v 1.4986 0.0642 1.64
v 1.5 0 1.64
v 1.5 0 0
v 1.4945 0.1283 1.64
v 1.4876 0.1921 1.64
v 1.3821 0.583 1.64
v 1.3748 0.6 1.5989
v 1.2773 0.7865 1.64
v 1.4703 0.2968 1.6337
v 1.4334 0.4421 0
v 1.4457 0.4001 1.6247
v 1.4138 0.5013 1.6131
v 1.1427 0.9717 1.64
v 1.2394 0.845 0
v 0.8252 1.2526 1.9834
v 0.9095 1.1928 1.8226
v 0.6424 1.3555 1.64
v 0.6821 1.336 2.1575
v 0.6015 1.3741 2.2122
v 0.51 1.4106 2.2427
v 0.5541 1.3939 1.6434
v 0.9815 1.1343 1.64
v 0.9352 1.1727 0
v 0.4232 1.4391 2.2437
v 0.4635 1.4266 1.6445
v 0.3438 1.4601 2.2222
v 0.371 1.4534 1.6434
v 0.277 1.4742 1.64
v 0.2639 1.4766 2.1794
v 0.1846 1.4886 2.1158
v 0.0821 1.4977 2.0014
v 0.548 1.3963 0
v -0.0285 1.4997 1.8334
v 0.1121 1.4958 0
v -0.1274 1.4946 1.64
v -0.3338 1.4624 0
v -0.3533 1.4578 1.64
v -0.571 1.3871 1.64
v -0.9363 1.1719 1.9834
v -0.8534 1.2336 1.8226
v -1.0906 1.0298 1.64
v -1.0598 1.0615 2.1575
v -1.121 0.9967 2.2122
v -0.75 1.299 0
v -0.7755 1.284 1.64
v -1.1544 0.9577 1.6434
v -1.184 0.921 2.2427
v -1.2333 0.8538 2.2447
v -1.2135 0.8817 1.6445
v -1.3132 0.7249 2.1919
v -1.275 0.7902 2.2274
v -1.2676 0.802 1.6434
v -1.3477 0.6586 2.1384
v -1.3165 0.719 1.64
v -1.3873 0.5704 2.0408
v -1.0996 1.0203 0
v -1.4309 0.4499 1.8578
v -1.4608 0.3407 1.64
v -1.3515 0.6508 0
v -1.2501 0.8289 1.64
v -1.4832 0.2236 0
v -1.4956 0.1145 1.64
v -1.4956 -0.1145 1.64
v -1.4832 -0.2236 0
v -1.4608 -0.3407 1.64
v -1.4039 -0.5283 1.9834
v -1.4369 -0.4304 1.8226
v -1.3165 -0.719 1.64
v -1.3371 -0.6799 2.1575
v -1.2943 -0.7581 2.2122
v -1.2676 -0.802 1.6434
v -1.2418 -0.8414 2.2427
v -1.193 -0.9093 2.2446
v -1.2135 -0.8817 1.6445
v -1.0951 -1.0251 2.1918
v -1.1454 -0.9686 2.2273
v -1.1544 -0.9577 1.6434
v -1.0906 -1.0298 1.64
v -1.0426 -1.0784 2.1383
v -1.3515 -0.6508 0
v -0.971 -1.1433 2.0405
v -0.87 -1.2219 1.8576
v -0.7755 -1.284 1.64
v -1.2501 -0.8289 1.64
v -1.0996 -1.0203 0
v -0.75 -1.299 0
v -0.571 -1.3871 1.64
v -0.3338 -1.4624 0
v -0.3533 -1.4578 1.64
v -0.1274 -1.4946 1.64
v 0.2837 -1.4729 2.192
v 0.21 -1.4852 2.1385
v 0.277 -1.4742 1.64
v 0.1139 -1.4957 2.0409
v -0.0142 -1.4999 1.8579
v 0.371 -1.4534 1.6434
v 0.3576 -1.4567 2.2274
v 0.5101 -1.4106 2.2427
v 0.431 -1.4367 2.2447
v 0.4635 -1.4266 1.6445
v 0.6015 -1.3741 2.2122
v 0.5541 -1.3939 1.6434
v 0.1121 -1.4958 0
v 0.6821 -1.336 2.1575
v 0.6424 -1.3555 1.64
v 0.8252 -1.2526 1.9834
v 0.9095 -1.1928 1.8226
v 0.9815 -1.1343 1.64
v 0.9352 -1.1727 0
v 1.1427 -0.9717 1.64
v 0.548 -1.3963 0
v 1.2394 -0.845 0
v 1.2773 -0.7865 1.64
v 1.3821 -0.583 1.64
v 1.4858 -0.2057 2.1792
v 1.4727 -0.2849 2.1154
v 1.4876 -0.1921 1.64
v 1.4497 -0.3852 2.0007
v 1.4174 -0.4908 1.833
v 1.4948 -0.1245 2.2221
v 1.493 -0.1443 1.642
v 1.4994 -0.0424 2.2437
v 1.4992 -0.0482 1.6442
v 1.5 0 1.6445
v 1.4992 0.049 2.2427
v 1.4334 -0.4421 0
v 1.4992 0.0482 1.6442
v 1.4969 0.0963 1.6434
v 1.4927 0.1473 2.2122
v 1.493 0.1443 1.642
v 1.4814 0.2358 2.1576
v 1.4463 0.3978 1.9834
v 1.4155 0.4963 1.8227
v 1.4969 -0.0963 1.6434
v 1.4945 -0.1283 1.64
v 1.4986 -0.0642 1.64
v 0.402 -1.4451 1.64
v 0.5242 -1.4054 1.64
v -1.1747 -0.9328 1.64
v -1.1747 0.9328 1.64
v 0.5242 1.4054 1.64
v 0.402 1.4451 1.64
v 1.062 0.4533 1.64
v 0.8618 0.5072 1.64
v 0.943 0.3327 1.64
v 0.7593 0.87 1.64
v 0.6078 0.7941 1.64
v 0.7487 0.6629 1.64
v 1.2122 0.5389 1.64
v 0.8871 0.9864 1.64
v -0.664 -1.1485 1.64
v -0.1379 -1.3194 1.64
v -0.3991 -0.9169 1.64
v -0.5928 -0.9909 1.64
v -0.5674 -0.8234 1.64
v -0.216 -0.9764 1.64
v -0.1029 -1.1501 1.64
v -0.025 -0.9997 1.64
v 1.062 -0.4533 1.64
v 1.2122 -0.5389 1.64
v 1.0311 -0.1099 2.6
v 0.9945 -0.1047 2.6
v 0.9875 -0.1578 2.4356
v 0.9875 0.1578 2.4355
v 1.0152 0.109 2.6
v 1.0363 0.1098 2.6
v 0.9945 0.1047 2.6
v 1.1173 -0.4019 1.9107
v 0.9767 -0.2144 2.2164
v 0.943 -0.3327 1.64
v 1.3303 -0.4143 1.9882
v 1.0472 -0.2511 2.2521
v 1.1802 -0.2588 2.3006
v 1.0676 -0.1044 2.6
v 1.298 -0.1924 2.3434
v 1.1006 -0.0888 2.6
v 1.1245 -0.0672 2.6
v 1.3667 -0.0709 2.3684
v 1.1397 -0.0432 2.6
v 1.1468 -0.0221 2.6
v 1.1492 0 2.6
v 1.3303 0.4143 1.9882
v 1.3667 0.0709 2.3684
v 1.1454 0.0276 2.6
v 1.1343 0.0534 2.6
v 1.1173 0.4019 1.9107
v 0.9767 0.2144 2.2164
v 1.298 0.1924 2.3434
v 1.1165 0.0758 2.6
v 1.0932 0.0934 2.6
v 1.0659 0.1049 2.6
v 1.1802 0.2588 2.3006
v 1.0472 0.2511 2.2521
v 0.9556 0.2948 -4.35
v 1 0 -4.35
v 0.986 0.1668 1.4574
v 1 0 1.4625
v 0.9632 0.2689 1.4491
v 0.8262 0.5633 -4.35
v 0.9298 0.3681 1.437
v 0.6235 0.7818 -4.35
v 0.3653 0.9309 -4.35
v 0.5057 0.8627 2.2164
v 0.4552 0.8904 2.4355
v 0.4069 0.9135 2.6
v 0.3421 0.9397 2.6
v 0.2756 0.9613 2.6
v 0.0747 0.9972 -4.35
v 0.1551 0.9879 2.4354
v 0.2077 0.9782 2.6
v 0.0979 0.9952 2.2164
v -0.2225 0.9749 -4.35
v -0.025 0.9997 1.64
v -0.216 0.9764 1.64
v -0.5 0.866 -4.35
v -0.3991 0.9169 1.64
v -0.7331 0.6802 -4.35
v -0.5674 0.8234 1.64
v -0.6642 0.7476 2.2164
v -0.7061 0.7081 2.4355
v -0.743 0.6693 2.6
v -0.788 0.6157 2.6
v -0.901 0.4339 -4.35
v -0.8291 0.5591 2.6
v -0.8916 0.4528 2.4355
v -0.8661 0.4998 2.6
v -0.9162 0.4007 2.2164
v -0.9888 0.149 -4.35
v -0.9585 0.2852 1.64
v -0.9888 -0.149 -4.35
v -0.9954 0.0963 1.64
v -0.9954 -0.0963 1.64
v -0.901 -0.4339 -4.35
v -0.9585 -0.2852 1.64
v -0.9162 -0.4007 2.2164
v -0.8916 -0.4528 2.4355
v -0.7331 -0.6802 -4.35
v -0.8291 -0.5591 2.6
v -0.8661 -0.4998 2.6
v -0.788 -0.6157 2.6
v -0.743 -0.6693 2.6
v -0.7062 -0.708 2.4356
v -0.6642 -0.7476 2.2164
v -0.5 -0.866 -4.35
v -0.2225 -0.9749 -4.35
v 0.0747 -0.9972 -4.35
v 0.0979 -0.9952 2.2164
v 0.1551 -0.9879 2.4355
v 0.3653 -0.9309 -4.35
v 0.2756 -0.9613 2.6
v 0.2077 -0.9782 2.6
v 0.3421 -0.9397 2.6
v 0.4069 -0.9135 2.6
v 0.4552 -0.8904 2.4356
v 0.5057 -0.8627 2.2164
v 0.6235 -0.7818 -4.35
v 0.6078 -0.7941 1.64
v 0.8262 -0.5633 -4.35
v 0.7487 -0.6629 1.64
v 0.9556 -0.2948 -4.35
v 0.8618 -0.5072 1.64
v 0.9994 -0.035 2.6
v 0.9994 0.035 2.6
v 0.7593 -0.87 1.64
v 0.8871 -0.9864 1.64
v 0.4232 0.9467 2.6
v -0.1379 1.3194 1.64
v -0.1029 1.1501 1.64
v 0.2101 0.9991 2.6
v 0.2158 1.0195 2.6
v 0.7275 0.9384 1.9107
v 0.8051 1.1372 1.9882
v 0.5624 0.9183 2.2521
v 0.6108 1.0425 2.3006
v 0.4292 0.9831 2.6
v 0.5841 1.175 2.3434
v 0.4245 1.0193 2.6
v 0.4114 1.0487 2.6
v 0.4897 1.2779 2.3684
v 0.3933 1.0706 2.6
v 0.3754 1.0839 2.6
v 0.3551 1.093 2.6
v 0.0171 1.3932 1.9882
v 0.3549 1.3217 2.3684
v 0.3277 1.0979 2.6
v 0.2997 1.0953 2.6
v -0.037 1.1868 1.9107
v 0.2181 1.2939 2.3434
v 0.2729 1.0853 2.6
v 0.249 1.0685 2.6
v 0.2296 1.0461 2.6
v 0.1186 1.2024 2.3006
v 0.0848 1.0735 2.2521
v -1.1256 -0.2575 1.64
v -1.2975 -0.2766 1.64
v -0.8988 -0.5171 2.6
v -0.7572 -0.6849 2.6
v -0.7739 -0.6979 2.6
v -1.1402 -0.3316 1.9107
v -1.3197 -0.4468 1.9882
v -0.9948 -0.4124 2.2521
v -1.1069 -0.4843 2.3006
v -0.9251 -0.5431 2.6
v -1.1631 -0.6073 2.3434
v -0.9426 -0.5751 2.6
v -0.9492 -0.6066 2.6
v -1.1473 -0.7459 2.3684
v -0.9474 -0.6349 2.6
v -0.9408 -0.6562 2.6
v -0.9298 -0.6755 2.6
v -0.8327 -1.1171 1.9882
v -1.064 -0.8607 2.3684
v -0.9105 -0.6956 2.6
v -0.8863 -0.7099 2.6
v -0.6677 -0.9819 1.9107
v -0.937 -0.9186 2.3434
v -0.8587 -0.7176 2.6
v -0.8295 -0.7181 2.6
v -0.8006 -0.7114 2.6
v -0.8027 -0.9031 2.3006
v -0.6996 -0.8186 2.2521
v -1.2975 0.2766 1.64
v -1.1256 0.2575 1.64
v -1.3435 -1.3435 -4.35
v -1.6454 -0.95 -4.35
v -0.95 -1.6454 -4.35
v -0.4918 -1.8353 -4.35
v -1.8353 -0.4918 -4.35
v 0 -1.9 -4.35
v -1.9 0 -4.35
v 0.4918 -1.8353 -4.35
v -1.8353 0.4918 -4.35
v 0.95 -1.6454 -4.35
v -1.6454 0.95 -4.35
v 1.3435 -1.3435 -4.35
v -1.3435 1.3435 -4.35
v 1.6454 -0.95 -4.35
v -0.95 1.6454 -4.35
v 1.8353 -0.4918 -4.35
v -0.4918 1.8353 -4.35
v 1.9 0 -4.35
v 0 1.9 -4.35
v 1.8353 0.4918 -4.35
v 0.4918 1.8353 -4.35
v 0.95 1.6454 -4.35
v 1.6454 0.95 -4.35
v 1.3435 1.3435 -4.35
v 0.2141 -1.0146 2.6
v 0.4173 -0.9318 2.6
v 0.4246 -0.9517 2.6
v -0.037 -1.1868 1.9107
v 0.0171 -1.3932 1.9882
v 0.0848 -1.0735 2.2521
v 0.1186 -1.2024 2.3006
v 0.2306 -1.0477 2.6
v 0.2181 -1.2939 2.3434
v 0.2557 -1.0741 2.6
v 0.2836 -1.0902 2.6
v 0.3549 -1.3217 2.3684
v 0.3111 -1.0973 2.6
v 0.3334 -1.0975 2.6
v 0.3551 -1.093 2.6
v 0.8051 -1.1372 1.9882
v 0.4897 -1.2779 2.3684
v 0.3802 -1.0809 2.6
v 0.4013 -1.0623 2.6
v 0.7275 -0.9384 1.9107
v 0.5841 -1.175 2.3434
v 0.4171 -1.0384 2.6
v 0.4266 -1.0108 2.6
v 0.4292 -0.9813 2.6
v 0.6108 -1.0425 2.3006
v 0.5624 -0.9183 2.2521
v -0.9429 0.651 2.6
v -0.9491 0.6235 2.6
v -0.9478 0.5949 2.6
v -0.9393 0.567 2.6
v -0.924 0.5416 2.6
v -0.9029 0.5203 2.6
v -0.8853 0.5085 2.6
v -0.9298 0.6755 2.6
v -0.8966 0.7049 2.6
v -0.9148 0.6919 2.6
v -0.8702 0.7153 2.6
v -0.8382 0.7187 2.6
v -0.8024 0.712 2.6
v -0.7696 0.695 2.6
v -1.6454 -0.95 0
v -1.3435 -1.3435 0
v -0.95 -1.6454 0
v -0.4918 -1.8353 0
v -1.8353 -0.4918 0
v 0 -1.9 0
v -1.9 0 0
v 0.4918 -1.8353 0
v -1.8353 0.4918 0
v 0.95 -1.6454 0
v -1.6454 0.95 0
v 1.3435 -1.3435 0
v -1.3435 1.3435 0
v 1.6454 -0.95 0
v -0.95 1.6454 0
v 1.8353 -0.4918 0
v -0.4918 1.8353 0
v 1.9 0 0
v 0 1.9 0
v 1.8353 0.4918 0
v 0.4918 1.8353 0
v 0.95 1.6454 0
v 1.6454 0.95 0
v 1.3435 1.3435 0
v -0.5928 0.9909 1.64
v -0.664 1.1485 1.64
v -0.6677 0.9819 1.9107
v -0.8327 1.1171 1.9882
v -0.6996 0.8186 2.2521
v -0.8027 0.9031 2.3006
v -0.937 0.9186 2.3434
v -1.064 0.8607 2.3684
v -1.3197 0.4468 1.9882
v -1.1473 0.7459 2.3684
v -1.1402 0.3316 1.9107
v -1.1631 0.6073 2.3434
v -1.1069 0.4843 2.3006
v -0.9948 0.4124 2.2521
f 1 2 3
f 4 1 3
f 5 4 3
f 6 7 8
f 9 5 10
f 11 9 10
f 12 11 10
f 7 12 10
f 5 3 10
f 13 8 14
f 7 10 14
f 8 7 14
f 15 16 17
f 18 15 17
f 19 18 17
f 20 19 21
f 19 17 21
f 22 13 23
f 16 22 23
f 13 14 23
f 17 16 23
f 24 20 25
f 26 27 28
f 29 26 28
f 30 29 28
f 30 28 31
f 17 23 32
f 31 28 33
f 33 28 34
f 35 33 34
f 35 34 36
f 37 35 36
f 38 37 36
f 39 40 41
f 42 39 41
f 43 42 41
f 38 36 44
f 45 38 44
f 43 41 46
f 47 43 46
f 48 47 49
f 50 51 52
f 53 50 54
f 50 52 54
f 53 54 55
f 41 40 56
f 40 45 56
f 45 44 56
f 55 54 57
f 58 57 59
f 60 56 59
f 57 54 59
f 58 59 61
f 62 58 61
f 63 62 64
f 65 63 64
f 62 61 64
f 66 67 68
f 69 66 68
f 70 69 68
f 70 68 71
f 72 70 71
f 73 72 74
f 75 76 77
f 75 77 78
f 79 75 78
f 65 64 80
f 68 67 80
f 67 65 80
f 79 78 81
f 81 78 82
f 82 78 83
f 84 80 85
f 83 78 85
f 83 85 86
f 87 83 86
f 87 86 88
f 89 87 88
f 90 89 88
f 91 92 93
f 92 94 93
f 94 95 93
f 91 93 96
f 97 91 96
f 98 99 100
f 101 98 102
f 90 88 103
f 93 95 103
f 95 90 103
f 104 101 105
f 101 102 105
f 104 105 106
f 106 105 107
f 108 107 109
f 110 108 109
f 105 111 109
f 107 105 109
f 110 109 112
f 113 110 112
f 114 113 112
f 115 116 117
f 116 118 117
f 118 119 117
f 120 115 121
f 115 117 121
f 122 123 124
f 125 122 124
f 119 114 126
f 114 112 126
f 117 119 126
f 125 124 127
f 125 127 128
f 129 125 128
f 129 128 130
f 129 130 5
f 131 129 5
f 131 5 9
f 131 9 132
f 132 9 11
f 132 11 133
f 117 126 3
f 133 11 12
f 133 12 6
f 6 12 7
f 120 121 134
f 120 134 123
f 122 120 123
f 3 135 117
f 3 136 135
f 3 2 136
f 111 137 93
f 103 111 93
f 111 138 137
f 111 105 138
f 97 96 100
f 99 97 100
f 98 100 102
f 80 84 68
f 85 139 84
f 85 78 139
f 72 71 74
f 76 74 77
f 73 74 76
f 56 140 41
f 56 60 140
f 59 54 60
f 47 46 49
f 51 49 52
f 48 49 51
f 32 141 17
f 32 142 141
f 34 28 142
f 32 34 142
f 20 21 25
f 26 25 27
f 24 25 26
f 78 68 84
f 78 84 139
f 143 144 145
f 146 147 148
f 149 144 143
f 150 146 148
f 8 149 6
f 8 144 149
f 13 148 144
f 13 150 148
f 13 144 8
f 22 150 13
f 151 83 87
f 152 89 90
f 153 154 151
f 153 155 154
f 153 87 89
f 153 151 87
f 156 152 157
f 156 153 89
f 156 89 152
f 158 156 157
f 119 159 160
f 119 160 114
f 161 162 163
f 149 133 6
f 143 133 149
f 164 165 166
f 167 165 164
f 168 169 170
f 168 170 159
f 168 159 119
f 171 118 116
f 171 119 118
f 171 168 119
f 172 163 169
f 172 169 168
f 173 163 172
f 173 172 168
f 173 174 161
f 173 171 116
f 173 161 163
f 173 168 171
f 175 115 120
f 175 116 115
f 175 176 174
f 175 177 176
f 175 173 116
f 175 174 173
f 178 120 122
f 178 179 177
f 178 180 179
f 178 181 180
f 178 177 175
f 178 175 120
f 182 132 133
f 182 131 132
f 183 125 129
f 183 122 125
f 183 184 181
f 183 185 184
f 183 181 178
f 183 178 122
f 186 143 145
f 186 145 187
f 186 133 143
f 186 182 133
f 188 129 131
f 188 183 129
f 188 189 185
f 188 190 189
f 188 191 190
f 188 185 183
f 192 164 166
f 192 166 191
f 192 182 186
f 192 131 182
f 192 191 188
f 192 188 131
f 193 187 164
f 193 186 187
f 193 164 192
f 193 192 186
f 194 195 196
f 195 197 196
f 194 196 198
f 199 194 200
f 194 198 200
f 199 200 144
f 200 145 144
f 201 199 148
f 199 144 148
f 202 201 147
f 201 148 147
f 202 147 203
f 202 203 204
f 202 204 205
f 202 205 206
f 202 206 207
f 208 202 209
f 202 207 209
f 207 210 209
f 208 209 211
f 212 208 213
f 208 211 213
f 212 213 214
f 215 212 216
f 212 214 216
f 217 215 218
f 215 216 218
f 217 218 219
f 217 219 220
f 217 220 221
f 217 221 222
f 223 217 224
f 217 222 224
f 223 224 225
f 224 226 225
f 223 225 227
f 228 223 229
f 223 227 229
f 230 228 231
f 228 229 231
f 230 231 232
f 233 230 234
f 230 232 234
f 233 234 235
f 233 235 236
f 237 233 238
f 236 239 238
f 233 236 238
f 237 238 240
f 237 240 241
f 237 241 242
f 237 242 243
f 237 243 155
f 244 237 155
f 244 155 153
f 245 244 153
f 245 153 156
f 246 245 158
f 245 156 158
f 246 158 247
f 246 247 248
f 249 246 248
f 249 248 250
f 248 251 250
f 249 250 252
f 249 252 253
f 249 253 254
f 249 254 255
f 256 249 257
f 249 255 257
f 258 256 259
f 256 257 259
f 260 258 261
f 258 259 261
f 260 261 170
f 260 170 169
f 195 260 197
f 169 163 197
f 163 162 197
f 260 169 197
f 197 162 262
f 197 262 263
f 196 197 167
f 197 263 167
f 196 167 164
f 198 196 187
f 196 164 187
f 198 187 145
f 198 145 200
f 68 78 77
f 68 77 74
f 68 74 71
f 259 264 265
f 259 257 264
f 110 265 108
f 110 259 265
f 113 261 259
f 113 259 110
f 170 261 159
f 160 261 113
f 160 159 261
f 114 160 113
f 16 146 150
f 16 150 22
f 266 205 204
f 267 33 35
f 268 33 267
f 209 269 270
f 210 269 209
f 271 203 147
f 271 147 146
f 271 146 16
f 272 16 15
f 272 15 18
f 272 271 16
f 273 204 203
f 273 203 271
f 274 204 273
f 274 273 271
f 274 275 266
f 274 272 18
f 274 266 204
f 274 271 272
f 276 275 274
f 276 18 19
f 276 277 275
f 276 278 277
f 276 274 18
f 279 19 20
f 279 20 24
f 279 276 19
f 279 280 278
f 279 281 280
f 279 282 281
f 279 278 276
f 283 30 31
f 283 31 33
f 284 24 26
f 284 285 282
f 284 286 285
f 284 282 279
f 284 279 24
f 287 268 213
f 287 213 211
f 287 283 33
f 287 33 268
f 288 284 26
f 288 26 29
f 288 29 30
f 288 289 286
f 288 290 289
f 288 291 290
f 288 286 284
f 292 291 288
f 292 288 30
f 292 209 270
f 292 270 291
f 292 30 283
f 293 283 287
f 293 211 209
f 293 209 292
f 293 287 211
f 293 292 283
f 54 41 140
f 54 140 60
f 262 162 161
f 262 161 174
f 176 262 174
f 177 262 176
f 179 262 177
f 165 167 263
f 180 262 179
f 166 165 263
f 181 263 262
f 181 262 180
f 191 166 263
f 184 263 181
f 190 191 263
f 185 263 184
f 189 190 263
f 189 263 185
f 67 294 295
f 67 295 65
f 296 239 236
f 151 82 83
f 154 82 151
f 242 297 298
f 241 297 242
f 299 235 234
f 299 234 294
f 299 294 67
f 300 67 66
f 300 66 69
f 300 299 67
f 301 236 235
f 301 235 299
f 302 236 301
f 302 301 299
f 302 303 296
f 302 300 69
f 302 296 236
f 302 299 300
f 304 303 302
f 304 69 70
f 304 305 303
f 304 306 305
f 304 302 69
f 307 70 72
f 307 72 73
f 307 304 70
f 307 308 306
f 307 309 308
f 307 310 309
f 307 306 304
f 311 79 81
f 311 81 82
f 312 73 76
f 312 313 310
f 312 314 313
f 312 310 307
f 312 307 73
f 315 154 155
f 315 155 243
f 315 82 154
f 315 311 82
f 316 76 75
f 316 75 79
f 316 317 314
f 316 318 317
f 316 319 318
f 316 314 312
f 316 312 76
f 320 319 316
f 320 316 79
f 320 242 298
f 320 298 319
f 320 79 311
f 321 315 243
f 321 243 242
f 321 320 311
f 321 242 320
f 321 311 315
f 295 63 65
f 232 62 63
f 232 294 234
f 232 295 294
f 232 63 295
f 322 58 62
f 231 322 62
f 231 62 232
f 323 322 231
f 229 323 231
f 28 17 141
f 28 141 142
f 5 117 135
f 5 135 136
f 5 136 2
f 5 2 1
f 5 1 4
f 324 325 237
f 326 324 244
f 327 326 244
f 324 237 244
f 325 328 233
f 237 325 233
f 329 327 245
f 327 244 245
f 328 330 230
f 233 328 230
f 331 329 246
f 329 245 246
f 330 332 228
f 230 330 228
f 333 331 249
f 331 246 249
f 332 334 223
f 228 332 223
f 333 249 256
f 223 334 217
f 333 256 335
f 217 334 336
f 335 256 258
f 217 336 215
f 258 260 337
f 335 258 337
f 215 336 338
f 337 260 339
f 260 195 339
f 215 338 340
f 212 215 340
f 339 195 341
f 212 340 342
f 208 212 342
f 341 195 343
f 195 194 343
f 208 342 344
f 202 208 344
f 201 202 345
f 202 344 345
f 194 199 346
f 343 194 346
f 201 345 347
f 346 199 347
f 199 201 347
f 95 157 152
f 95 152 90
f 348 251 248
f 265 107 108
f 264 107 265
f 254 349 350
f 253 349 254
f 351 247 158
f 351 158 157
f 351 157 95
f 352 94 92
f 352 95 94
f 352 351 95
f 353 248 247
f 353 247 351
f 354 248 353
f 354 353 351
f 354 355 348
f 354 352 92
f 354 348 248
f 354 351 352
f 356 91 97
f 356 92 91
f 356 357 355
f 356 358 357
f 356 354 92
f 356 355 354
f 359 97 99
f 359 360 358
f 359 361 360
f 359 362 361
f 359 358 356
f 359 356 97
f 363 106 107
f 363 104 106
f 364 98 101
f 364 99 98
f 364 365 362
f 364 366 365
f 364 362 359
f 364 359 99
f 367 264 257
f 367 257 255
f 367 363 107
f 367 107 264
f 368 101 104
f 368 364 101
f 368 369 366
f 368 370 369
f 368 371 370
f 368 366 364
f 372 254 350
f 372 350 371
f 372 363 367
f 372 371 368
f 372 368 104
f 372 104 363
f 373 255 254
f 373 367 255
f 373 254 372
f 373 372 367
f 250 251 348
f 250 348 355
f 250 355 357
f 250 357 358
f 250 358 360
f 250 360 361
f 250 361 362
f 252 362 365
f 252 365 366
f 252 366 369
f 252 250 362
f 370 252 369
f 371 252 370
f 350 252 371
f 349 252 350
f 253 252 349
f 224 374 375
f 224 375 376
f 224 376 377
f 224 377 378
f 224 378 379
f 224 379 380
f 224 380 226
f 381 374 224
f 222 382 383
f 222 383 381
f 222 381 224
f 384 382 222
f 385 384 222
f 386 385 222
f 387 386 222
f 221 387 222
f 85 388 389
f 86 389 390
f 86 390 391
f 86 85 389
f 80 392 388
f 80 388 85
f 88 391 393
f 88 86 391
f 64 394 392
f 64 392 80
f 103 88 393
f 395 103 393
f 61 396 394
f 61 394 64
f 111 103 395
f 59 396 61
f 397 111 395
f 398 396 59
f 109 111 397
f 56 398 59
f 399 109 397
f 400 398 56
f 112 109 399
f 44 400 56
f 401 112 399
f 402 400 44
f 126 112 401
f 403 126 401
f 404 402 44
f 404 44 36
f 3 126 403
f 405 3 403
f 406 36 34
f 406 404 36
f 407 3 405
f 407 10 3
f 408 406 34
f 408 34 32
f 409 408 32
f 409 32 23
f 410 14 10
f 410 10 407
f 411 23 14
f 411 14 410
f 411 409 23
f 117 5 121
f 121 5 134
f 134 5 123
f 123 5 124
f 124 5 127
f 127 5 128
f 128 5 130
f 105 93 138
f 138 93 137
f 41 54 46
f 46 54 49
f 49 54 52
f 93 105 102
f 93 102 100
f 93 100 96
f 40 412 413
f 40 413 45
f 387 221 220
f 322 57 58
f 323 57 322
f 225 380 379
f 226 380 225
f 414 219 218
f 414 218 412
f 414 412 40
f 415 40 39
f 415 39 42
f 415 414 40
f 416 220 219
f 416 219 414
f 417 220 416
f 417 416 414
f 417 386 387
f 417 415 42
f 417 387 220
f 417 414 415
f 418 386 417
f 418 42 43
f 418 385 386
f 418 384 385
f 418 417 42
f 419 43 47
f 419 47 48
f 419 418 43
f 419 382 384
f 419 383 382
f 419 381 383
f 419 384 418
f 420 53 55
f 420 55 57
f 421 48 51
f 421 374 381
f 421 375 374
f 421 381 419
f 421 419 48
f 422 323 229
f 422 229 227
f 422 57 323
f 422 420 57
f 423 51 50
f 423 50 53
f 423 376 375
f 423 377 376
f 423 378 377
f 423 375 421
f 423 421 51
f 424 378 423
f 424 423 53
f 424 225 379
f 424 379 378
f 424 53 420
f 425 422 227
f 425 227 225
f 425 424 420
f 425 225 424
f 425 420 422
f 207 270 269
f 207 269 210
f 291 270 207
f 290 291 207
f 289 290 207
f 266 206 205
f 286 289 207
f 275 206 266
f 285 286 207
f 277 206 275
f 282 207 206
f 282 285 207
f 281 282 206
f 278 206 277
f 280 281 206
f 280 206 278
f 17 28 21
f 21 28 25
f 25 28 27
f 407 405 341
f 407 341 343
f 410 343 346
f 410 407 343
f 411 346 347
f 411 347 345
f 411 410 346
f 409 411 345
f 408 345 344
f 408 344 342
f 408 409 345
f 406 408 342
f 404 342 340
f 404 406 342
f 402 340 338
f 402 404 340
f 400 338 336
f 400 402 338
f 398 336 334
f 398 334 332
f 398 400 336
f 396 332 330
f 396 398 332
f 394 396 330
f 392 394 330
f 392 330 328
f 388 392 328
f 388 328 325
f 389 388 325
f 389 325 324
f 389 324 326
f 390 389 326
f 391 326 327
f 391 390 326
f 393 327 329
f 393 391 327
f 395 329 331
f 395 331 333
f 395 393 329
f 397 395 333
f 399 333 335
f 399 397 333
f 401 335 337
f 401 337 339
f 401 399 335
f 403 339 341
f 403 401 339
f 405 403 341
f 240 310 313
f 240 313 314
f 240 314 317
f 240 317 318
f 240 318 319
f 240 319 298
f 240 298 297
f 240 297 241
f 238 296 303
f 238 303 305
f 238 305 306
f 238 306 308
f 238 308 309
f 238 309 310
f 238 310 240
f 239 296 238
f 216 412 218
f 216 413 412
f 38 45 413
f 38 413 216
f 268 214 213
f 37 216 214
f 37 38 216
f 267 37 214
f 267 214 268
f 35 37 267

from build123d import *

# Parameters (mm, degrees)
F0_R      = 1.5
F0_R_2    = 1
F1_DEPTH  = 2.6
F5_COUNT  = 5
F5_ANGLE  = 288
F17_DEPTH = 1.64
F0_R_3    = 1.9
F18_DEPTH = 4.35


with BuildPart() as f1:
    # F0 (on Top) → F1 (new body)
    with BuildSketch(Plane.XY):
        Circle(F0_R)
        Circle(F0_R_2, mode=Mode.SUBTRACT)
    extrude(amount=F1_DEPTH)


with BuildPart() as f4:
    # F3 (on Front) → F4 (revolve)
    with BuildSketch(Plane.XZ):
        Polygon((0.9303738137, 2.820600407), (1.375, 1.599), (1.9388155725, 1.804212086), align=None)
    revolve(axis=Axis((1.1526869068, 0, 2.2098002035), (-0.3420201433, 0, 0.9396926208)))


with BuildPart() as f5_1:
    # F5: instance of F4
    add(f4.part.rotate(Axis((0, 0, 0.7995), (0, 0, 1)), 1 * F5_ANGLE / (F5_COUNT - 1)))


with BuildPart() as f5_2:
    # F5: instance of F4
    add(f4.part.rotate(Axis((0, 0, 0.7995), (0, 0, 1)), 2 * F5_ANGLE / (F5_COUNT - 1)))


with BuildPart() as f5_3:
    # F5: instance of F4
    add(f4.part.rotate(Axis((0, 0, 0.7995), (0, 0, 1)), 3 * F5_ANGLE / (F5_COUNT - 1)))


with BuildPart() as f5_4:
    # F5: instance of F4
    add(f4.part.rotate(Axis((0, 0, 0.7995), (0, 0, 1)), 4 * F5_ANGLE / (F5_COUNT - 1)))


with BuildPart() as f6_1:
    # F6: copy of F1
    add(f1.part)


with BuildPart() as f1_1:
    add(f1.part)

    # F7: intersect F4
    add(f4.part, mode=Mode.INTERSECT)



with BuildPart() as f8_1:
    # F8: copy of F6_1
    add(f6_1.part)


with BuildPart() as f9_1:
    # F9: copy of F8_1
    add(f8_1.part)


with BuildPart() as f10_1:
    # F10: copy of F9_1
    add(f9_1.part)


with BuildPart() as f5_1_1:
    add(f5_1.part)

    # F11: intersect F6_1
    add(f6_1.part, mode=Mode.INTERSECT)


with BuildPart() as f5_2_1:
    add(f5_2.part)

    # F12: intersect F8_1
    add(f8_1.part, mode=Mode.INTERSECT)


with BuildPart() as f5_3_1:
    add(f5_3.part)

    # F13: intersect F9_1
    add(f9_1.part, mode=Mode.INTERSECT)


with BuildPart() as f14_1:
    # F14: copy of F10_1
    add(f10_1.part)


with BuildPart() as f10_1_1:
    add(f10_1.part)

    # F15: intersect F5_4
    add(f5_4.part, mode=Mode.INTERSECT)


with BuildPart() as f17:
    # F0 (on Top) → F17 (new body)
    with BuildSketch(Plane.XY):
        Circle(F0_R)
        Circle(F0_R_2, mode=Mode.SUBTRACT)
    extrude(amount=F17_DEPTH)


with BuildPart() as f1_2:
    add(f1_1.part)

    add(f5_1_1.part)  # F18 merges F5_1

    add(f5_2_1.part)  # F18 merges F5_2

    add(f5_3_1.part)  # F18 merges F5_3

    add(f10_1_1.part)  # F18 merges F10_1

    add(f17.part)  # F18 merges F17
    # F0 (on Top) → F18 (join)
    with BuildSketch(Plane.XY):
        Circle(F0_R_3)
        Circle(F0_R, mode=Mode.SUBTRACT)
        Circle(F0_R)
        Circle(F0_R_2, mode=Mode.SUBTRACT)
    extrude(amount=-F18_DEPTH)


solid = f1_2.part
